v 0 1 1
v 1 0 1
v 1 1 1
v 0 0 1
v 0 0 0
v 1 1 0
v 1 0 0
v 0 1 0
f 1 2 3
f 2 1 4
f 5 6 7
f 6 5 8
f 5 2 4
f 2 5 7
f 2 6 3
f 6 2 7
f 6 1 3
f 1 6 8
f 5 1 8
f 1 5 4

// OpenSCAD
// Attached to the first statement, not a doc.
x = 1;
cube(x);
